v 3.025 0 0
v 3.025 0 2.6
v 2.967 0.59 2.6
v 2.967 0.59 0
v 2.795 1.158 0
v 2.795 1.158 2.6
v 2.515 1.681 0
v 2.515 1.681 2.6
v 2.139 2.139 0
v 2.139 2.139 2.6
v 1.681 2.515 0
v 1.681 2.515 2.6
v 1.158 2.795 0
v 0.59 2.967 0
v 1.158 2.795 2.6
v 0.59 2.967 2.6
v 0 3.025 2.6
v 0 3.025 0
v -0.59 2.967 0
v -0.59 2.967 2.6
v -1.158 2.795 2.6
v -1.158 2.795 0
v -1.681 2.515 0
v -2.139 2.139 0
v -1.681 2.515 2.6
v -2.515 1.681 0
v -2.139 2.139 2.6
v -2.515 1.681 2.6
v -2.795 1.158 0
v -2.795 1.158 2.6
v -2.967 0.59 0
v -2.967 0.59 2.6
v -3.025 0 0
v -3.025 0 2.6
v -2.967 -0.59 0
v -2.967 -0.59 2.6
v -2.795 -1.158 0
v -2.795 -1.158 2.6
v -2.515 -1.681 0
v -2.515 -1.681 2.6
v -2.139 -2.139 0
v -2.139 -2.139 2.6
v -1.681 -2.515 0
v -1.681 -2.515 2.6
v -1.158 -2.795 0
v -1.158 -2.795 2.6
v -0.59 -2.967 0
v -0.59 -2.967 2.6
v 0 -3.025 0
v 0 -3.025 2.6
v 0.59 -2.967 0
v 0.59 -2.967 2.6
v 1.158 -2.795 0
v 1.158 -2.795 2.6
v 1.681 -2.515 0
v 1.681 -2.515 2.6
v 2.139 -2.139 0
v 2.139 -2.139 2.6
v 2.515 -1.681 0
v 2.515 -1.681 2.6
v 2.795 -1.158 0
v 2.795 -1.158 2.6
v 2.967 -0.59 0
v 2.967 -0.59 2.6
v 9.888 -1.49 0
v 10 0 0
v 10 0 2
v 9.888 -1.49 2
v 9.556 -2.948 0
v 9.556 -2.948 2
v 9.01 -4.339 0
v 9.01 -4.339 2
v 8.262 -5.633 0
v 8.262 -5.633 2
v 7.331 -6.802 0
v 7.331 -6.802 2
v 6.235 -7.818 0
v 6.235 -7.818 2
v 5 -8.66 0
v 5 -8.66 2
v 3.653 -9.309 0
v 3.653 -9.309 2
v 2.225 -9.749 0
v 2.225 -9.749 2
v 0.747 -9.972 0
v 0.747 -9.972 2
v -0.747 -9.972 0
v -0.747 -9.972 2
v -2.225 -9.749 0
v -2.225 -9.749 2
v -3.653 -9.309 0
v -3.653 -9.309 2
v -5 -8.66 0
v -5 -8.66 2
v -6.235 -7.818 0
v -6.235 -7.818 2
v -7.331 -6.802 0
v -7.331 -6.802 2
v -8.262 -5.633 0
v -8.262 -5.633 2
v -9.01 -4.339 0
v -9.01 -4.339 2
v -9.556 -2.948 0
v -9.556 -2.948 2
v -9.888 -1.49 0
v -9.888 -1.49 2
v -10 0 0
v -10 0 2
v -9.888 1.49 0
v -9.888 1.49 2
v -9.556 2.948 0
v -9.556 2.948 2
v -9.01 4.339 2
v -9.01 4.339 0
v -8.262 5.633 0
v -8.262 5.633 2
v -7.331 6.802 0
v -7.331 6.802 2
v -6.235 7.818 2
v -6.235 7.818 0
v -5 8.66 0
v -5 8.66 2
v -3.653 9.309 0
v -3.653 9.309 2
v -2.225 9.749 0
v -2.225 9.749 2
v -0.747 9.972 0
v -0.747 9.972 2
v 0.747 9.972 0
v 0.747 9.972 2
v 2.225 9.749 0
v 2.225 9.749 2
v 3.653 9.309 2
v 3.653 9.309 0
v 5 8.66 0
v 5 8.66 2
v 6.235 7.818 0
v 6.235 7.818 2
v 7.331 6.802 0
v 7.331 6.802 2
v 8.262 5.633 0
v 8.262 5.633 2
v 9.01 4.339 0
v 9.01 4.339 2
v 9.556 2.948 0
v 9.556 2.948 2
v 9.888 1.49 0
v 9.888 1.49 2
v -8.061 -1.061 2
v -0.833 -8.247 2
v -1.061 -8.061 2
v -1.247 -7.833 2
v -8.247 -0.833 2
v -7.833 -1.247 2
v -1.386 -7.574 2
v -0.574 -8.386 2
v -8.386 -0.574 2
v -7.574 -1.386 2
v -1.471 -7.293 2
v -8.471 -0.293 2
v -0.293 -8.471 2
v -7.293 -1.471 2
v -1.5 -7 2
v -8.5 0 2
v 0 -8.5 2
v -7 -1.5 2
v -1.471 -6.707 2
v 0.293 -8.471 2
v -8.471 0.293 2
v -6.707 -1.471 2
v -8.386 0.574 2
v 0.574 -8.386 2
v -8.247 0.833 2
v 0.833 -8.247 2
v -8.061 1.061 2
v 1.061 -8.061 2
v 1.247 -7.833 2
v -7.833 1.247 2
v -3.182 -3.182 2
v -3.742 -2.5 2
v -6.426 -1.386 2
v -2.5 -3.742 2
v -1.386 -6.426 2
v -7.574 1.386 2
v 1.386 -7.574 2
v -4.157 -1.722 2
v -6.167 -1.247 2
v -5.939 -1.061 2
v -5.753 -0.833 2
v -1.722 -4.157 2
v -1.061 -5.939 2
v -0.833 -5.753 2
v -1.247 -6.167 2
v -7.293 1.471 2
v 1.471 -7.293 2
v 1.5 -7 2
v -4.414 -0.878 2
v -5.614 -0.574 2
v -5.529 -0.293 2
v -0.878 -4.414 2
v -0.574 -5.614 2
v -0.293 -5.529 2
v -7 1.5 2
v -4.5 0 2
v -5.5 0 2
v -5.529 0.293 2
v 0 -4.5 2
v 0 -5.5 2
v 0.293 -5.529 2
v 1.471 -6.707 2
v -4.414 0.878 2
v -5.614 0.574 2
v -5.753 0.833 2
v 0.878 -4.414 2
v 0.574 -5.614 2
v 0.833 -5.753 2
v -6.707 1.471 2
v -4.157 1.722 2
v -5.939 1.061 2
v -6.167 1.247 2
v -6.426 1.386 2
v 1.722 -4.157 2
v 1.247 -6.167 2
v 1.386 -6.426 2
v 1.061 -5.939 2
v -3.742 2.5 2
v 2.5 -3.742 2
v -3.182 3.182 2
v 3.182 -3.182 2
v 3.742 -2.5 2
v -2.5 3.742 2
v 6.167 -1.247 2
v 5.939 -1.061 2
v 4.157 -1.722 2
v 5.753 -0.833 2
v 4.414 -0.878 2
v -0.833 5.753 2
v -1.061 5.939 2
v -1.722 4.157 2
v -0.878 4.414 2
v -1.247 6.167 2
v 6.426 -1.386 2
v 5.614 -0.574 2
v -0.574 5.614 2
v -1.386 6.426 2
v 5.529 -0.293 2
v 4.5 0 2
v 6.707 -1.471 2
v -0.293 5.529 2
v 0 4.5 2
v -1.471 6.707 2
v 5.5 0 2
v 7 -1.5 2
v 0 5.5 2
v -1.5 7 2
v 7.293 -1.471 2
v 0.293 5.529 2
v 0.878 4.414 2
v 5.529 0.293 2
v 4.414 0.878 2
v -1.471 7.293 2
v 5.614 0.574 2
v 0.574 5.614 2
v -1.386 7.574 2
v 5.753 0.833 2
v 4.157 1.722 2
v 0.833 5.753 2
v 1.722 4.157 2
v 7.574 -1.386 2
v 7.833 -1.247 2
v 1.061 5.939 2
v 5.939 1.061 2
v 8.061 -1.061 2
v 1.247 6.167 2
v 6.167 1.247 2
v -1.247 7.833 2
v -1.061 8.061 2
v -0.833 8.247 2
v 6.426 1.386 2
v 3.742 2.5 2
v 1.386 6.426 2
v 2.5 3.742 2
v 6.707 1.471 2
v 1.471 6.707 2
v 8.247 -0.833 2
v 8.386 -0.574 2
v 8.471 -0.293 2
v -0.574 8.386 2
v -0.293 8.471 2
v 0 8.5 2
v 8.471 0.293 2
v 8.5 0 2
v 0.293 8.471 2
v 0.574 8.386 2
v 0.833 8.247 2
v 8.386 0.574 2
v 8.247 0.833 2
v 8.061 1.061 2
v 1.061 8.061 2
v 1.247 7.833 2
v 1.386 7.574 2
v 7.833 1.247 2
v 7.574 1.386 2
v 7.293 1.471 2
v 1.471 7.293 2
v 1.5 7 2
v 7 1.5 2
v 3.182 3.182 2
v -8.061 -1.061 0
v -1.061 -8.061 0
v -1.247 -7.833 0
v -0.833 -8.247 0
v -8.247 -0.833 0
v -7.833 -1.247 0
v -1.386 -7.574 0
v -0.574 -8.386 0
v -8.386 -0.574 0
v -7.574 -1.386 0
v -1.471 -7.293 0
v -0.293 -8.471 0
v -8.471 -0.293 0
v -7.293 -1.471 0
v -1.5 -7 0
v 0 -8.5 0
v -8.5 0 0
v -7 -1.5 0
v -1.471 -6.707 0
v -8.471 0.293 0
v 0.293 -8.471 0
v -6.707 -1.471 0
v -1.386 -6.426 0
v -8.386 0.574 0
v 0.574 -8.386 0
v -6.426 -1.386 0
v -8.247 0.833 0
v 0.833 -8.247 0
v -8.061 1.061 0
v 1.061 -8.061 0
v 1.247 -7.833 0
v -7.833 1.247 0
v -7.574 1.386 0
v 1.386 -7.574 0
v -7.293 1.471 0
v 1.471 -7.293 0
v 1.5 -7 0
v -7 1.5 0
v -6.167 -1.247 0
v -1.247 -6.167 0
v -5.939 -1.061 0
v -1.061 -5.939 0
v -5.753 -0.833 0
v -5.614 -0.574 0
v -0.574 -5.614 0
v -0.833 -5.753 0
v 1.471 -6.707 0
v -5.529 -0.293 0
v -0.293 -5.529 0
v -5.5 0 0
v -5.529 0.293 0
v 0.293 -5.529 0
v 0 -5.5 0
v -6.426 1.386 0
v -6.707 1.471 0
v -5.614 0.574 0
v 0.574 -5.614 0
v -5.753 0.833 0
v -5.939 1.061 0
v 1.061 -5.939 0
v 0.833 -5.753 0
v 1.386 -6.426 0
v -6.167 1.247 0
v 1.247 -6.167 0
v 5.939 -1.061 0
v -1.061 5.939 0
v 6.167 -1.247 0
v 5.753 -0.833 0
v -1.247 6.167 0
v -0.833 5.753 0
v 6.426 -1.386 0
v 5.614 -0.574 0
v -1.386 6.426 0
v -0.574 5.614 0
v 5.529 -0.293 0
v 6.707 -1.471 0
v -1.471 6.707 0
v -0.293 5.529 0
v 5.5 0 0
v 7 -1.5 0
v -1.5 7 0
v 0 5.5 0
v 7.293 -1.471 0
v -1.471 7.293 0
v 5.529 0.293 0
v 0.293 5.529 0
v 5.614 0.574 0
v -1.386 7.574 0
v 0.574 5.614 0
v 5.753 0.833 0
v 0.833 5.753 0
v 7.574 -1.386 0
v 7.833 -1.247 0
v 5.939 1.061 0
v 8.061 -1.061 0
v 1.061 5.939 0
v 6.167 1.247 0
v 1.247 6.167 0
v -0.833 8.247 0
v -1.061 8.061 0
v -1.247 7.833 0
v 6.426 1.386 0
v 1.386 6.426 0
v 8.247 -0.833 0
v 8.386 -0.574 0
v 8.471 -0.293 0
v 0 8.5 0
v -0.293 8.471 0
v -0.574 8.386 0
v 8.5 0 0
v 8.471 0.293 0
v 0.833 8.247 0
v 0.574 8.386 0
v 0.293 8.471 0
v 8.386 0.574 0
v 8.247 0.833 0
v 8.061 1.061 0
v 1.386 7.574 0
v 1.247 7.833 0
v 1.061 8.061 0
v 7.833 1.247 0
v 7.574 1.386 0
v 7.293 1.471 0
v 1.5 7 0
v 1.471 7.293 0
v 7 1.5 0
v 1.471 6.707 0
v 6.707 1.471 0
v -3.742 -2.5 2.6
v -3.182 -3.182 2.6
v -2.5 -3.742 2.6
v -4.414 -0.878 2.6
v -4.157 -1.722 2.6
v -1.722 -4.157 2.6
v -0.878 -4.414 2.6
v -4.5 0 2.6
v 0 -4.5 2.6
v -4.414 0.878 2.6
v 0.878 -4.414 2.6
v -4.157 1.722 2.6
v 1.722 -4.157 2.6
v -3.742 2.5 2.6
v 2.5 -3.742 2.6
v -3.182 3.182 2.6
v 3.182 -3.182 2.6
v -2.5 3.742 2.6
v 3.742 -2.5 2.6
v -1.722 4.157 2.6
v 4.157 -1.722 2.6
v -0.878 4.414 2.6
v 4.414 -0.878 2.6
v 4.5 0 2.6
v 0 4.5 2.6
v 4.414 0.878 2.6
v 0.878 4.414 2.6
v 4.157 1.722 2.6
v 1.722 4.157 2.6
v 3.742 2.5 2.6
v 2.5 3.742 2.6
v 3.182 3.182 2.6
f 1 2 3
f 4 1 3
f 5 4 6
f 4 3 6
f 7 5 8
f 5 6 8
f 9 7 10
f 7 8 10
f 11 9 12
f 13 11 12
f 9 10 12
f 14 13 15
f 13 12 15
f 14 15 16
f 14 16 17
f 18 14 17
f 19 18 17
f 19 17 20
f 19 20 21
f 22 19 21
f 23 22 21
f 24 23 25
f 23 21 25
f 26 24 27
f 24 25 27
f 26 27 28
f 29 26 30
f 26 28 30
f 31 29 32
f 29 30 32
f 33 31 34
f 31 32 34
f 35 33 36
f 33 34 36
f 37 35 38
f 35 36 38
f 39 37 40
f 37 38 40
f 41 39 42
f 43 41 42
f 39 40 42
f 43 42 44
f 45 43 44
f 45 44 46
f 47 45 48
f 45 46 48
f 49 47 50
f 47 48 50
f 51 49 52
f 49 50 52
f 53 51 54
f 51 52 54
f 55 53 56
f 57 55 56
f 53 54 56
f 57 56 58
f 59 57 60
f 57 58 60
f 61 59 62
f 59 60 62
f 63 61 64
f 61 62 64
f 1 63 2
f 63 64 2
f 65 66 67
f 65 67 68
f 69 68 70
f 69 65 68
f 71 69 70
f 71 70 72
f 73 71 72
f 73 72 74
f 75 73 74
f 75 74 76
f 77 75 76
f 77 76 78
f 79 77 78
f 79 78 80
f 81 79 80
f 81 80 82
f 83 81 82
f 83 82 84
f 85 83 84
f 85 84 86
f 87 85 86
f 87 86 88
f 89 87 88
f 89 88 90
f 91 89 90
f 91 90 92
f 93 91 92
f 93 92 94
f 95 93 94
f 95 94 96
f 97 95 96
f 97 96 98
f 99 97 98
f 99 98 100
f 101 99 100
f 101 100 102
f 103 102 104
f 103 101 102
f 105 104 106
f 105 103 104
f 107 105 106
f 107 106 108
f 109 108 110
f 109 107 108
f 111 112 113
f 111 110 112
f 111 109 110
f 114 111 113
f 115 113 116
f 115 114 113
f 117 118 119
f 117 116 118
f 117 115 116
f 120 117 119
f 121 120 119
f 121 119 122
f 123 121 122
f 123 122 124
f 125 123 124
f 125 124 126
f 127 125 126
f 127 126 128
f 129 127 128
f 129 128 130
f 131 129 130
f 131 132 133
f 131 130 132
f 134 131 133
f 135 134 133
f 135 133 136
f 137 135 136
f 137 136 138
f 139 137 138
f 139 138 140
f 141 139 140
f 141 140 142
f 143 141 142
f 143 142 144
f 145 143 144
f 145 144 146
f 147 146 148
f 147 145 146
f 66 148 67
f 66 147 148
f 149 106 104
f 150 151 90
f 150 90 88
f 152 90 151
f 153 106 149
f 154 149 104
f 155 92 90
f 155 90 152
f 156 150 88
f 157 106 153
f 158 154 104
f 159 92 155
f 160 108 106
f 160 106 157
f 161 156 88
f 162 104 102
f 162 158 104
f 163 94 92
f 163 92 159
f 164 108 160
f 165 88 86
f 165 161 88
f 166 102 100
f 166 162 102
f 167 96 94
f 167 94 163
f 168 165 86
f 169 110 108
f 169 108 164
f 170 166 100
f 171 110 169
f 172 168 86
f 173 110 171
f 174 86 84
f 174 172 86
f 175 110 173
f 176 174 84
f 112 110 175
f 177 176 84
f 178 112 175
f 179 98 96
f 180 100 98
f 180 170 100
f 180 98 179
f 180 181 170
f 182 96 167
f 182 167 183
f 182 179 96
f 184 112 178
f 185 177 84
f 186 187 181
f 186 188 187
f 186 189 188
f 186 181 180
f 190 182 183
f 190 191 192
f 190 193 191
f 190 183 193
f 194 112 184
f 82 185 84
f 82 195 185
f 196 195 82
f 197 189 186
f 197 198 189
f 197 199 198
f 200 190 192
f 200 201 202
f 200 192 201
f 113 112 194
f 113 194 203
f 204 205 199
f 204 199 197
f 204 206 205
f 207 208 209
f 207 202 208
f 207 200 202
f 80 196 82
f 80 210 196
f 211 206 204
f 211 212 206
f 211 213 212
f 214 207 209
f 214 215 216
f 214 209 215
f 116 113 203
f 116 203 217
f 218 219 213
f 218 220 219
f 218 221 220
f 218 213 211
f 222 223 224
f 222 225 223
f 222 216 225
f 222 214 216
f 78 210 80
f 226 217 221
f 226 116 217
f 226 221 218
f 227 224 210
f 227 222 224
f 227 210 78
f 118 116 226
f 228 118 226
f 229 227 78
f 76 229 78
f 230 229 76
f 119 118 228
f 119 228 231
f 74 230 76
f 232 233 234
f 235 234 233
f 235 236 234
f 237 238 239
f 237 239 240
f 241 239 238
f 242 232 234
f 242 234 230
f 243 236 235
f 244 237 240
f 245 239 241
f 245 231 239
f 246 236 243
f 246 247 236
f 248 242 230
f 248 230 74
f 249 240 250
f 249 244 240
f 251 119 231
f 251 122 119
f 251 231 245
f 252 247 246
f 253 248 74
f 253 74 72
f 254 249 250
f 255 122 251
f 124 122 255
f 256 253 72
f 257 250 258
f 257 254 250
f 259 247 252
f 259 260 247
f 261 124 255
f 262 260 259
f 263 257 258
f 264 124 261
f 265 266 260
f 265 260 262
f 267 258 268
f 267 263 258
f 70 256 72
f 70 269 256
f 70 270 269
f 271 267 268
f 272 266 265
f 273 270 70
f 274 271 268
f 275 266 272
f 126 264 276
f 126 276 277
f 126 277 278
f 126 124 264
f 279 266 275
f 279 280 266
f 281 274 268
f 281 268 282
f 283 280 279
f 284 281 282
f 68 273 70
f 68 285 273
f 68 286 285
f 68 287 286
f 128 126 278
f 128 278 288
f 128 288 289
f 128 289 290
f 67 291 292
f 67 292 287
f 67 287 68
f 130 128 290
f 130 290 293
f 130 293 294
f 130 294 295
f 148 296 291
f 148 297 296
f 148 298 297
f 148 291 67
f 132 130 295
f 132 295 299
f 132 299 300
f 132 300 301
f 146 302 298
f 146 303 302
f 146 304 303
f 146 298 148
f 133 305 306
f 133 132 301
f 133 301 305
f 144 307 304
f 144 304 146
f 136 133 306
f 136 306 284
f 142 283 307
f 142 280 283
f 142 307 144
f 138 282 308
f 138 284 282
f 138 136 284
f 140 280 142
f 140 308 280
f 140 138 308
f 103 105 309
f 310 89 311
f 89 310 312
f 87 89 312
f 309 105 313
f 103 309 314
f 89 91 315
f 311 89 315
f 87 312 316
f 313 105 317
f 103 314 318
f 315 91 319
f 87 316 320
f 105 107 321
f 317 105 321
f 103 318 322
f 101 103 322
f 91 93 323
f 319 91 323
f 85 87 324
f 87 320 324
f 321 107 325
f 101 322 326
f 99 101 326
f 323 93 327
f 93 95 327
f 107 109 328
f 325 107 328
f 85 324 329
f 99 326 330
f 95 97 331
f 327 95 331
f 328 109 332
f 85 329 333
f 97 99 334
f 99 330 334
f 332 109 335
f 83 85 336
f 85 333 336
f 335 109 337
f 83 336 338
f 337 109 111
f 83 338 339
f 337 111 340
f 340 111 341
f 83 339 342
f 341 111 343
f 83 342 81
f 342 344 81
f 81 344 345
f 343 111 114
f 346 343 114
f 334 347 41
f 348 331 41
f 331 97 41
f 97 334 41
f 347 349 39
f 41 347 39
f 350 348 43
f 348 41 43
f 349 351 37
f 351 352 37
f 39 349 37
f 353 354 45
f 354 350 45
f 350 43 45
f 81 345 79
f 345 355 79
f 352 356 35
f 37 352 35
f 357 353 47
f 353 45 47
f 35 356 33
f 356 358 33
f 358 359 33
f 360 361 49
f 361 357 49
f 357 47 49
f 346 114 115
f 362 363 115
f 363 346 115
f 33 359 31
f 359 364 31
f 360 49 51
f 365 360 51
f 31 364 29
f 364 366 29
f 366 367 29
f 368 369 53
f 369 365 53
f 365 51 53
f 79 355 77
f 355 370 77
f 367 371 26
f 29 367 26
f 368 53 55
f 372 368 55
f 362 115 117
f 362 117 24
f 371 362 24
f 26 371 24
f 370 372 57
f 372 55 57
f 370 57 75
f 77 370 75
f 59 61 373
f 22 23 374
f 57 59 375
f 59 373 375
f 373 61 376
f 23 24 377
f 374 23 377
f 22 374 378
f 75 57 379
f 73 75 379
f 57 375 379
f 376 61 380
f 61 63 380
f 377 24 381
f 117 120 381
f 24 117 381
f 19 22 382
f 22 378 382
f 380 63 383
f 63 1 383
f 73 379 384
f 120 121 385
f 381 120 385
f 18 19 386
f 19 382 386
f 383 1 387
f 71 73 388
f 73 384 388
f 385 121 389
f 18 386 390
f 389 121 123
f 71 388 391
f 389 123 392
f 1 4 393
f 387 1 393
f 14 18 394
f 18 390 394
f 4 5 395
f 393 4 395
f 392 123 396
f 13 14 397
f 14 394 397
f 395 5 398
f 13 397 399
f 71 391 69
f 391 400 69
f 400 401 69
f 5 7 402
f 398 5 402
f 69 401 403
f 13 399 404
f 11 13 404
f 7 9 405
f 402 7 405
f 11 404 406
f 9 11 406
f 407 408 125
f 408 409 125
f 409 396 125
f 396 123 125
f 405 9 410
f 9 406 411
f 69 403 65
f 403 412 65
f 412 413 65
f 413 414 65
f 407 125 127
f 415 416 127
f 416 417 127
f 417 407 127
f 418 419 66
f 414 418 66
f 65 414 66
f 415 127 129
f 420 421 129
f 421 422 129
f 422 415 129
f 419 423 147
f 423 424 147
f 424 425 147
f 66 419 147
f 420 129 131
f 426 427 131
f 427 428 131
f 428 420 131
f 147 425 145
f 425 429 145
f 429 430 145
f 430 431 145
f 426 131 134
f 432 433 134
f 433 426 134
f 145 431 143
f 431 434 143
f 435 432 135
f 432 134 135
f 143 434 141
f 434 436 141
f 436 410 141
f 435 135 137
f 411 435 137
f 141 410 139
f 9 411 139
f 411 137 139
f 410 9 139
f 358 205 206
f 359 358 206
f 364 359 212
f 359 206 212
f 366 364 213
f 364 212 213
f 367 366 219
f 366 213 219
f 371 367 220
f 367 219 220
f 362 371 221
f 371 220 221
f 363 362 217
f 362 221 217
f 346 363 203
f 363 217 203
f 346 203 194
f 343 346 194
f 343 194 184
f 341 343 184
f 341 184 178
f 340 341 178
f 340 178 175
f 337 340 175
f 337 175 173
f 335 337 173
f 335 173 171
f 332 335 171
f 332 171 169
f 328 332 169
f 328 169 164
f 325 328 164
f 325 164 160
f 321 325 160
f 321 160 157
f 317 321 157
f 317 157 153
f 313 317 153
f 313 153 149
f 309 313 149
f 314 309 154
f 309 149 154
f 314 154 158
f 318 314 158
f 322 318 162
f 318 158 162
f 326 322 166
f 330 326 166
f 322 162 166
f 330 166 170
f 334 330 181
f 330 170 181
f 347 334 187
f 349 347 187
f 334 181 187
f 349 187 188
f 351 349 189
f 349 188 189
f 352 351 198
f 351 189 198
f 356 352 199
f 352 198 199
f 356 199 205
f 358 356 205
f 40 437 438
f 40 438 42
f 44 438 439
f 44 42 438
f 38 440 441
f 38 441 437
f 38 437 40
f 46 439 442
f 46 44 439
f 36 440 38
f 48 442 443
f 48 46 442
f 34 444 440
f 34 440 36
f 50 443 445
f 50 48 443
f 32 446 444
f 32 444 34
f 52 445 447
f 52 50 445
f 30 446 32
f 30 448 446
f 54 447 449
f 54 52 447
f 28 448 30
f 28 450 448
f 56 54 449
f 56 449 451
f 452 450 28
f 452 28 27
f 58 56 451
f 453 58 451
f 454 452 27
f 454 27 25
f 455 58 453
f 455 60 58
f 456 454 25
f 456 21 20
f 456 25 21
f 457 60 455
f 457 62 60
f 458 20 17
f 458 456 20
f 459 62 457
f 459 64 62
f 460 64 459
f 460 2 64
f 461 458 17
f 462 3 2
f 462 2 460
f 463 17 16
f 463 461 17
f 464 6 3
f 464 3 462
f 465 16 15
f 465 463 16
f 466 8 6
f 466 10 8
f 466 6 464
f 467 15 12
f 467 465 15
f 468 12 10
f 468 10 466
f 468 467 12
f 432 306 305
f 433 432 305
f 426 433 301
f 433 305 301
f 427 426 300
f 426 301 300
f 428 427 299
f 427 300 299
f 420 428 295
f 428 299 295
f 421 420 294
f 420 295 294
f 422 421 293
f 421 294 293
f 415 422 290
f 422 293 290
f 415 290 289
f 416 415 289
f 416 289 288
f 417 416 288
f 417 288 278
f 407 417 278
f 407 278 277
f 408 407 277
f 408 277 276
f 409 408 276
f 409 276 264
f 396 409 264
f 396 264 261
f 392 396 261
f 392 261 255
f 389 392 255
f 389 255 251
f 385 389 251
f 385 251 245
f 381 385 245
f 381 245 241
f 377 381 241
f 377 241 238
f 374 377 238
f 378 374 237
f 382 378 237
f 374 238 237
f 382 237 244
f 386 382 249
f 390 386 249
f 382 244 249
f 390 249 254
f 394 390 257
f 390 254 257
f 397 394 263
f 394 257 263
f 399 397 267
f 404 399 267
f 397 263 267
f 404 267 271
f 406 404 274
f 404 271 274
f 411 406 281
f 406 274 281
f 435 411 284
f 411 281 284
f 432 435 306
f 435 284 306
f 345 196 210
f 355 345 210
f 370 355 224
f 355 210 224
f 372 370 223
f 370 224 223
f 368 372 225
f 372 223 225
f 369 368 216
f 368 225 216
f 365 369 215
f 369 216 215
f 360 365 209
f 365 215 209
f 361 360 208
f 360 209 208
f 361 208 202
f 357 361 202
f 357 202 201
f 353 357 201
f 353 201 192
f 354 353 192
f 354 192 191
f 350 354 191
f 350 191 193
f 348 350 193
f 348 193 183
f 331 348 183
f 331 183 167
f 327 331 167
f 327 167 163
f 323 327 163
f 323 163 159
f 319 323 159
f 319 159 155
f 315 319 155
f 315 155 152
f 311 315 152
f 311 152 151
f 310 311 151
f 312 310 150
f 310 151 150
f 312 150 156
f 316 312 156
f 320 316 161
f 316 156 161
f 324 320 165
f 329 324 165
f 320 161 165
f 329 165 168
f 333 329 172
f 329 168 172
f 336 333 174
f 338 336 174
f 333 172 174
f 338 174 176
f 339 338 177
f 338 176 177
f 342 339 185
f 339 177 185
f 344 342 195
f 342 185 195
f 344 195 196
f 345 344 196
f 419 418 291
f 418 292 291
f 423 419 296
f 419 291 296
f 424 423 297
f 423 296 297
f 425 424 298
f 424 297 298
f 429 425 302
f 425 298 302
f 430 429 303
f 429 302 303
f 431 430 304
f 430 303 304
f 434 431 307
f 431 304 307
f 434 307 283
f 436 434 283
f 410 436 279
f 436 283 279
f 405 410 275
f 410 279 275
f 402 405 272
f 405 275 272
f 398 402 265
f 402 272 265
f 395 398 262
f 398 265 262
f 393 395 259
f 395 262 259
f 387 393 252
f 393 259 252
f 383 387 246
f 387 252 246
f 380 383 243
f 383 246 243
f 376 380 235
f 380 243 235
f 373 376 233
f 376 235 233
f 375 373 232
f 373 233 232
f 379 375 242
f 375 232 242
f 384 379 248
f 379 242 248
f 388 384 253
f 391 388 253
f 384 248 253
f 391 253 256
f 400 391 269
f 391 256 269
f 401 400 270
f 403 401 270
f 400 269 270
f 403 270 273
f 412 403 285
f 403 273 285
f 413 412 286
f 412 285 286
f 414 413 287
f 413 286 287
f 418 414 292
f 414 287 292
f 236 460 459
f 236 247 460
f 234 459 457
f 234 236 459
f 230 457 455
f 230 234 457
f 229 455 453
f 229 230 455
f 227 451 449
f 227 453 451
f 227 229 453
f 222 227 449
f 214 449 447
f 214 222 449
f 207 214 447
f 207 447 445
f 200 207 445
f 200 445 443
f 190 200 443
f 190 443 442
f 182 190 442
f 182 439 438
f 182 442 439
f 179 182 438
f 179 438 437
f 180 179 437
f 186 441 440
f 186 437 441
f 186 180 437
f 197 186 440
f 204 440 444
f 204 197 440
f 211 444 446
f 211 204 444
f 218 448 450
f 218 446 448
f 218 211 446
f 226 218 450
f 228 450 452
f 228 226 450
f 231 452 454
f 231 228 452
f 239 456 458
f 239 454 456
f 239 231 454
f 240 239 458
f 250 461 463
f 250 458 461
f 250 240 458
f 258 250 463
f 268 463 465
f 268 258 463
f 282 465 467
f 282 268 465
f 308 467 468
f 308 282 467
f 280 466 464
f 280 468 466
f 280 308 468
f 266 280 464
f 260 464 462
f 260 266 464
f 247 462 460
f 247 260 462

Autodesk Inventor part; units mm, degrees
ref_plane "YZ Plane" through (0, 0, 0) normal (1, 0, 0) x (0, 1, 0)
ref_plane "XZ Plane" through (0, 0, 0) normal (0, 1, 0) x (-1, 0, 0)
ref_plane "XY Plane" through (0, 0, 0) normal (0, 0, 1) x (1, 0, 0)
sketch "Sketch1" plane through (0, 0, 0) normal (0, 0, 1) x (1, 0, 0)
  circle A0 centre (0, 0) radius 10
  dimension "d0" = 20
extrude "Extrusion1" add sketch "Sketch1" along normal blind 2
sketch "Sketch2" plane through (0, 0, 2) normal (0, 0, 1) x (1, 0, 0)
  circle A0 centre (0, 0) radius 4.5
  dimension "d3" = 9
extrude "Extrusion2" add sketch "Sketch2" along normal blind 0.6
sketch "Sketch4" plane through (0, 0, 2.6) normal (0, 0, 1) x (1, 0, 0)
  circle A0 centre (0, 0) radius 3.025
  dimension "d9" = 6.05
extrude "Extrusion4" cut sketch "Sketch4" against normal through all
sketch "Sketch5" plane through (0, 0, 2) normal (0, 0, 1) x (1, 0, 0)
  line L0 (0, 0) -> (0, 7)
  circle A0 centre (0, 7) radius 1.5
  circle A1 centre (-7, 0) radius 1.5
  circle A2 centre (0, -7) radius 1.5
  circle A3 centre (7, 0) radius 1.5
  dimension "d12" = 7
  dimension "d13" = 3
  dimension "d16" = 360
extrude "Extrusion5" cut sketch "Sketch5" against normal through all
thread "Thread1" size "M3x0.5" class "6H" standard "ANSI Metric M Profile" full length
thread "Thread2" size "M3x0.5" class "6H" standard "ANSI Metric M Profile" full length
thread "Thread3" size "M3x0.5" class "6H" standard "ANSI Metric M Profile" full length
thread "Thread4" size "M3x0.5" class "6H" standard "ANSI Metric M Profile" full length
properties part number "servo_FT_SC_horn"
